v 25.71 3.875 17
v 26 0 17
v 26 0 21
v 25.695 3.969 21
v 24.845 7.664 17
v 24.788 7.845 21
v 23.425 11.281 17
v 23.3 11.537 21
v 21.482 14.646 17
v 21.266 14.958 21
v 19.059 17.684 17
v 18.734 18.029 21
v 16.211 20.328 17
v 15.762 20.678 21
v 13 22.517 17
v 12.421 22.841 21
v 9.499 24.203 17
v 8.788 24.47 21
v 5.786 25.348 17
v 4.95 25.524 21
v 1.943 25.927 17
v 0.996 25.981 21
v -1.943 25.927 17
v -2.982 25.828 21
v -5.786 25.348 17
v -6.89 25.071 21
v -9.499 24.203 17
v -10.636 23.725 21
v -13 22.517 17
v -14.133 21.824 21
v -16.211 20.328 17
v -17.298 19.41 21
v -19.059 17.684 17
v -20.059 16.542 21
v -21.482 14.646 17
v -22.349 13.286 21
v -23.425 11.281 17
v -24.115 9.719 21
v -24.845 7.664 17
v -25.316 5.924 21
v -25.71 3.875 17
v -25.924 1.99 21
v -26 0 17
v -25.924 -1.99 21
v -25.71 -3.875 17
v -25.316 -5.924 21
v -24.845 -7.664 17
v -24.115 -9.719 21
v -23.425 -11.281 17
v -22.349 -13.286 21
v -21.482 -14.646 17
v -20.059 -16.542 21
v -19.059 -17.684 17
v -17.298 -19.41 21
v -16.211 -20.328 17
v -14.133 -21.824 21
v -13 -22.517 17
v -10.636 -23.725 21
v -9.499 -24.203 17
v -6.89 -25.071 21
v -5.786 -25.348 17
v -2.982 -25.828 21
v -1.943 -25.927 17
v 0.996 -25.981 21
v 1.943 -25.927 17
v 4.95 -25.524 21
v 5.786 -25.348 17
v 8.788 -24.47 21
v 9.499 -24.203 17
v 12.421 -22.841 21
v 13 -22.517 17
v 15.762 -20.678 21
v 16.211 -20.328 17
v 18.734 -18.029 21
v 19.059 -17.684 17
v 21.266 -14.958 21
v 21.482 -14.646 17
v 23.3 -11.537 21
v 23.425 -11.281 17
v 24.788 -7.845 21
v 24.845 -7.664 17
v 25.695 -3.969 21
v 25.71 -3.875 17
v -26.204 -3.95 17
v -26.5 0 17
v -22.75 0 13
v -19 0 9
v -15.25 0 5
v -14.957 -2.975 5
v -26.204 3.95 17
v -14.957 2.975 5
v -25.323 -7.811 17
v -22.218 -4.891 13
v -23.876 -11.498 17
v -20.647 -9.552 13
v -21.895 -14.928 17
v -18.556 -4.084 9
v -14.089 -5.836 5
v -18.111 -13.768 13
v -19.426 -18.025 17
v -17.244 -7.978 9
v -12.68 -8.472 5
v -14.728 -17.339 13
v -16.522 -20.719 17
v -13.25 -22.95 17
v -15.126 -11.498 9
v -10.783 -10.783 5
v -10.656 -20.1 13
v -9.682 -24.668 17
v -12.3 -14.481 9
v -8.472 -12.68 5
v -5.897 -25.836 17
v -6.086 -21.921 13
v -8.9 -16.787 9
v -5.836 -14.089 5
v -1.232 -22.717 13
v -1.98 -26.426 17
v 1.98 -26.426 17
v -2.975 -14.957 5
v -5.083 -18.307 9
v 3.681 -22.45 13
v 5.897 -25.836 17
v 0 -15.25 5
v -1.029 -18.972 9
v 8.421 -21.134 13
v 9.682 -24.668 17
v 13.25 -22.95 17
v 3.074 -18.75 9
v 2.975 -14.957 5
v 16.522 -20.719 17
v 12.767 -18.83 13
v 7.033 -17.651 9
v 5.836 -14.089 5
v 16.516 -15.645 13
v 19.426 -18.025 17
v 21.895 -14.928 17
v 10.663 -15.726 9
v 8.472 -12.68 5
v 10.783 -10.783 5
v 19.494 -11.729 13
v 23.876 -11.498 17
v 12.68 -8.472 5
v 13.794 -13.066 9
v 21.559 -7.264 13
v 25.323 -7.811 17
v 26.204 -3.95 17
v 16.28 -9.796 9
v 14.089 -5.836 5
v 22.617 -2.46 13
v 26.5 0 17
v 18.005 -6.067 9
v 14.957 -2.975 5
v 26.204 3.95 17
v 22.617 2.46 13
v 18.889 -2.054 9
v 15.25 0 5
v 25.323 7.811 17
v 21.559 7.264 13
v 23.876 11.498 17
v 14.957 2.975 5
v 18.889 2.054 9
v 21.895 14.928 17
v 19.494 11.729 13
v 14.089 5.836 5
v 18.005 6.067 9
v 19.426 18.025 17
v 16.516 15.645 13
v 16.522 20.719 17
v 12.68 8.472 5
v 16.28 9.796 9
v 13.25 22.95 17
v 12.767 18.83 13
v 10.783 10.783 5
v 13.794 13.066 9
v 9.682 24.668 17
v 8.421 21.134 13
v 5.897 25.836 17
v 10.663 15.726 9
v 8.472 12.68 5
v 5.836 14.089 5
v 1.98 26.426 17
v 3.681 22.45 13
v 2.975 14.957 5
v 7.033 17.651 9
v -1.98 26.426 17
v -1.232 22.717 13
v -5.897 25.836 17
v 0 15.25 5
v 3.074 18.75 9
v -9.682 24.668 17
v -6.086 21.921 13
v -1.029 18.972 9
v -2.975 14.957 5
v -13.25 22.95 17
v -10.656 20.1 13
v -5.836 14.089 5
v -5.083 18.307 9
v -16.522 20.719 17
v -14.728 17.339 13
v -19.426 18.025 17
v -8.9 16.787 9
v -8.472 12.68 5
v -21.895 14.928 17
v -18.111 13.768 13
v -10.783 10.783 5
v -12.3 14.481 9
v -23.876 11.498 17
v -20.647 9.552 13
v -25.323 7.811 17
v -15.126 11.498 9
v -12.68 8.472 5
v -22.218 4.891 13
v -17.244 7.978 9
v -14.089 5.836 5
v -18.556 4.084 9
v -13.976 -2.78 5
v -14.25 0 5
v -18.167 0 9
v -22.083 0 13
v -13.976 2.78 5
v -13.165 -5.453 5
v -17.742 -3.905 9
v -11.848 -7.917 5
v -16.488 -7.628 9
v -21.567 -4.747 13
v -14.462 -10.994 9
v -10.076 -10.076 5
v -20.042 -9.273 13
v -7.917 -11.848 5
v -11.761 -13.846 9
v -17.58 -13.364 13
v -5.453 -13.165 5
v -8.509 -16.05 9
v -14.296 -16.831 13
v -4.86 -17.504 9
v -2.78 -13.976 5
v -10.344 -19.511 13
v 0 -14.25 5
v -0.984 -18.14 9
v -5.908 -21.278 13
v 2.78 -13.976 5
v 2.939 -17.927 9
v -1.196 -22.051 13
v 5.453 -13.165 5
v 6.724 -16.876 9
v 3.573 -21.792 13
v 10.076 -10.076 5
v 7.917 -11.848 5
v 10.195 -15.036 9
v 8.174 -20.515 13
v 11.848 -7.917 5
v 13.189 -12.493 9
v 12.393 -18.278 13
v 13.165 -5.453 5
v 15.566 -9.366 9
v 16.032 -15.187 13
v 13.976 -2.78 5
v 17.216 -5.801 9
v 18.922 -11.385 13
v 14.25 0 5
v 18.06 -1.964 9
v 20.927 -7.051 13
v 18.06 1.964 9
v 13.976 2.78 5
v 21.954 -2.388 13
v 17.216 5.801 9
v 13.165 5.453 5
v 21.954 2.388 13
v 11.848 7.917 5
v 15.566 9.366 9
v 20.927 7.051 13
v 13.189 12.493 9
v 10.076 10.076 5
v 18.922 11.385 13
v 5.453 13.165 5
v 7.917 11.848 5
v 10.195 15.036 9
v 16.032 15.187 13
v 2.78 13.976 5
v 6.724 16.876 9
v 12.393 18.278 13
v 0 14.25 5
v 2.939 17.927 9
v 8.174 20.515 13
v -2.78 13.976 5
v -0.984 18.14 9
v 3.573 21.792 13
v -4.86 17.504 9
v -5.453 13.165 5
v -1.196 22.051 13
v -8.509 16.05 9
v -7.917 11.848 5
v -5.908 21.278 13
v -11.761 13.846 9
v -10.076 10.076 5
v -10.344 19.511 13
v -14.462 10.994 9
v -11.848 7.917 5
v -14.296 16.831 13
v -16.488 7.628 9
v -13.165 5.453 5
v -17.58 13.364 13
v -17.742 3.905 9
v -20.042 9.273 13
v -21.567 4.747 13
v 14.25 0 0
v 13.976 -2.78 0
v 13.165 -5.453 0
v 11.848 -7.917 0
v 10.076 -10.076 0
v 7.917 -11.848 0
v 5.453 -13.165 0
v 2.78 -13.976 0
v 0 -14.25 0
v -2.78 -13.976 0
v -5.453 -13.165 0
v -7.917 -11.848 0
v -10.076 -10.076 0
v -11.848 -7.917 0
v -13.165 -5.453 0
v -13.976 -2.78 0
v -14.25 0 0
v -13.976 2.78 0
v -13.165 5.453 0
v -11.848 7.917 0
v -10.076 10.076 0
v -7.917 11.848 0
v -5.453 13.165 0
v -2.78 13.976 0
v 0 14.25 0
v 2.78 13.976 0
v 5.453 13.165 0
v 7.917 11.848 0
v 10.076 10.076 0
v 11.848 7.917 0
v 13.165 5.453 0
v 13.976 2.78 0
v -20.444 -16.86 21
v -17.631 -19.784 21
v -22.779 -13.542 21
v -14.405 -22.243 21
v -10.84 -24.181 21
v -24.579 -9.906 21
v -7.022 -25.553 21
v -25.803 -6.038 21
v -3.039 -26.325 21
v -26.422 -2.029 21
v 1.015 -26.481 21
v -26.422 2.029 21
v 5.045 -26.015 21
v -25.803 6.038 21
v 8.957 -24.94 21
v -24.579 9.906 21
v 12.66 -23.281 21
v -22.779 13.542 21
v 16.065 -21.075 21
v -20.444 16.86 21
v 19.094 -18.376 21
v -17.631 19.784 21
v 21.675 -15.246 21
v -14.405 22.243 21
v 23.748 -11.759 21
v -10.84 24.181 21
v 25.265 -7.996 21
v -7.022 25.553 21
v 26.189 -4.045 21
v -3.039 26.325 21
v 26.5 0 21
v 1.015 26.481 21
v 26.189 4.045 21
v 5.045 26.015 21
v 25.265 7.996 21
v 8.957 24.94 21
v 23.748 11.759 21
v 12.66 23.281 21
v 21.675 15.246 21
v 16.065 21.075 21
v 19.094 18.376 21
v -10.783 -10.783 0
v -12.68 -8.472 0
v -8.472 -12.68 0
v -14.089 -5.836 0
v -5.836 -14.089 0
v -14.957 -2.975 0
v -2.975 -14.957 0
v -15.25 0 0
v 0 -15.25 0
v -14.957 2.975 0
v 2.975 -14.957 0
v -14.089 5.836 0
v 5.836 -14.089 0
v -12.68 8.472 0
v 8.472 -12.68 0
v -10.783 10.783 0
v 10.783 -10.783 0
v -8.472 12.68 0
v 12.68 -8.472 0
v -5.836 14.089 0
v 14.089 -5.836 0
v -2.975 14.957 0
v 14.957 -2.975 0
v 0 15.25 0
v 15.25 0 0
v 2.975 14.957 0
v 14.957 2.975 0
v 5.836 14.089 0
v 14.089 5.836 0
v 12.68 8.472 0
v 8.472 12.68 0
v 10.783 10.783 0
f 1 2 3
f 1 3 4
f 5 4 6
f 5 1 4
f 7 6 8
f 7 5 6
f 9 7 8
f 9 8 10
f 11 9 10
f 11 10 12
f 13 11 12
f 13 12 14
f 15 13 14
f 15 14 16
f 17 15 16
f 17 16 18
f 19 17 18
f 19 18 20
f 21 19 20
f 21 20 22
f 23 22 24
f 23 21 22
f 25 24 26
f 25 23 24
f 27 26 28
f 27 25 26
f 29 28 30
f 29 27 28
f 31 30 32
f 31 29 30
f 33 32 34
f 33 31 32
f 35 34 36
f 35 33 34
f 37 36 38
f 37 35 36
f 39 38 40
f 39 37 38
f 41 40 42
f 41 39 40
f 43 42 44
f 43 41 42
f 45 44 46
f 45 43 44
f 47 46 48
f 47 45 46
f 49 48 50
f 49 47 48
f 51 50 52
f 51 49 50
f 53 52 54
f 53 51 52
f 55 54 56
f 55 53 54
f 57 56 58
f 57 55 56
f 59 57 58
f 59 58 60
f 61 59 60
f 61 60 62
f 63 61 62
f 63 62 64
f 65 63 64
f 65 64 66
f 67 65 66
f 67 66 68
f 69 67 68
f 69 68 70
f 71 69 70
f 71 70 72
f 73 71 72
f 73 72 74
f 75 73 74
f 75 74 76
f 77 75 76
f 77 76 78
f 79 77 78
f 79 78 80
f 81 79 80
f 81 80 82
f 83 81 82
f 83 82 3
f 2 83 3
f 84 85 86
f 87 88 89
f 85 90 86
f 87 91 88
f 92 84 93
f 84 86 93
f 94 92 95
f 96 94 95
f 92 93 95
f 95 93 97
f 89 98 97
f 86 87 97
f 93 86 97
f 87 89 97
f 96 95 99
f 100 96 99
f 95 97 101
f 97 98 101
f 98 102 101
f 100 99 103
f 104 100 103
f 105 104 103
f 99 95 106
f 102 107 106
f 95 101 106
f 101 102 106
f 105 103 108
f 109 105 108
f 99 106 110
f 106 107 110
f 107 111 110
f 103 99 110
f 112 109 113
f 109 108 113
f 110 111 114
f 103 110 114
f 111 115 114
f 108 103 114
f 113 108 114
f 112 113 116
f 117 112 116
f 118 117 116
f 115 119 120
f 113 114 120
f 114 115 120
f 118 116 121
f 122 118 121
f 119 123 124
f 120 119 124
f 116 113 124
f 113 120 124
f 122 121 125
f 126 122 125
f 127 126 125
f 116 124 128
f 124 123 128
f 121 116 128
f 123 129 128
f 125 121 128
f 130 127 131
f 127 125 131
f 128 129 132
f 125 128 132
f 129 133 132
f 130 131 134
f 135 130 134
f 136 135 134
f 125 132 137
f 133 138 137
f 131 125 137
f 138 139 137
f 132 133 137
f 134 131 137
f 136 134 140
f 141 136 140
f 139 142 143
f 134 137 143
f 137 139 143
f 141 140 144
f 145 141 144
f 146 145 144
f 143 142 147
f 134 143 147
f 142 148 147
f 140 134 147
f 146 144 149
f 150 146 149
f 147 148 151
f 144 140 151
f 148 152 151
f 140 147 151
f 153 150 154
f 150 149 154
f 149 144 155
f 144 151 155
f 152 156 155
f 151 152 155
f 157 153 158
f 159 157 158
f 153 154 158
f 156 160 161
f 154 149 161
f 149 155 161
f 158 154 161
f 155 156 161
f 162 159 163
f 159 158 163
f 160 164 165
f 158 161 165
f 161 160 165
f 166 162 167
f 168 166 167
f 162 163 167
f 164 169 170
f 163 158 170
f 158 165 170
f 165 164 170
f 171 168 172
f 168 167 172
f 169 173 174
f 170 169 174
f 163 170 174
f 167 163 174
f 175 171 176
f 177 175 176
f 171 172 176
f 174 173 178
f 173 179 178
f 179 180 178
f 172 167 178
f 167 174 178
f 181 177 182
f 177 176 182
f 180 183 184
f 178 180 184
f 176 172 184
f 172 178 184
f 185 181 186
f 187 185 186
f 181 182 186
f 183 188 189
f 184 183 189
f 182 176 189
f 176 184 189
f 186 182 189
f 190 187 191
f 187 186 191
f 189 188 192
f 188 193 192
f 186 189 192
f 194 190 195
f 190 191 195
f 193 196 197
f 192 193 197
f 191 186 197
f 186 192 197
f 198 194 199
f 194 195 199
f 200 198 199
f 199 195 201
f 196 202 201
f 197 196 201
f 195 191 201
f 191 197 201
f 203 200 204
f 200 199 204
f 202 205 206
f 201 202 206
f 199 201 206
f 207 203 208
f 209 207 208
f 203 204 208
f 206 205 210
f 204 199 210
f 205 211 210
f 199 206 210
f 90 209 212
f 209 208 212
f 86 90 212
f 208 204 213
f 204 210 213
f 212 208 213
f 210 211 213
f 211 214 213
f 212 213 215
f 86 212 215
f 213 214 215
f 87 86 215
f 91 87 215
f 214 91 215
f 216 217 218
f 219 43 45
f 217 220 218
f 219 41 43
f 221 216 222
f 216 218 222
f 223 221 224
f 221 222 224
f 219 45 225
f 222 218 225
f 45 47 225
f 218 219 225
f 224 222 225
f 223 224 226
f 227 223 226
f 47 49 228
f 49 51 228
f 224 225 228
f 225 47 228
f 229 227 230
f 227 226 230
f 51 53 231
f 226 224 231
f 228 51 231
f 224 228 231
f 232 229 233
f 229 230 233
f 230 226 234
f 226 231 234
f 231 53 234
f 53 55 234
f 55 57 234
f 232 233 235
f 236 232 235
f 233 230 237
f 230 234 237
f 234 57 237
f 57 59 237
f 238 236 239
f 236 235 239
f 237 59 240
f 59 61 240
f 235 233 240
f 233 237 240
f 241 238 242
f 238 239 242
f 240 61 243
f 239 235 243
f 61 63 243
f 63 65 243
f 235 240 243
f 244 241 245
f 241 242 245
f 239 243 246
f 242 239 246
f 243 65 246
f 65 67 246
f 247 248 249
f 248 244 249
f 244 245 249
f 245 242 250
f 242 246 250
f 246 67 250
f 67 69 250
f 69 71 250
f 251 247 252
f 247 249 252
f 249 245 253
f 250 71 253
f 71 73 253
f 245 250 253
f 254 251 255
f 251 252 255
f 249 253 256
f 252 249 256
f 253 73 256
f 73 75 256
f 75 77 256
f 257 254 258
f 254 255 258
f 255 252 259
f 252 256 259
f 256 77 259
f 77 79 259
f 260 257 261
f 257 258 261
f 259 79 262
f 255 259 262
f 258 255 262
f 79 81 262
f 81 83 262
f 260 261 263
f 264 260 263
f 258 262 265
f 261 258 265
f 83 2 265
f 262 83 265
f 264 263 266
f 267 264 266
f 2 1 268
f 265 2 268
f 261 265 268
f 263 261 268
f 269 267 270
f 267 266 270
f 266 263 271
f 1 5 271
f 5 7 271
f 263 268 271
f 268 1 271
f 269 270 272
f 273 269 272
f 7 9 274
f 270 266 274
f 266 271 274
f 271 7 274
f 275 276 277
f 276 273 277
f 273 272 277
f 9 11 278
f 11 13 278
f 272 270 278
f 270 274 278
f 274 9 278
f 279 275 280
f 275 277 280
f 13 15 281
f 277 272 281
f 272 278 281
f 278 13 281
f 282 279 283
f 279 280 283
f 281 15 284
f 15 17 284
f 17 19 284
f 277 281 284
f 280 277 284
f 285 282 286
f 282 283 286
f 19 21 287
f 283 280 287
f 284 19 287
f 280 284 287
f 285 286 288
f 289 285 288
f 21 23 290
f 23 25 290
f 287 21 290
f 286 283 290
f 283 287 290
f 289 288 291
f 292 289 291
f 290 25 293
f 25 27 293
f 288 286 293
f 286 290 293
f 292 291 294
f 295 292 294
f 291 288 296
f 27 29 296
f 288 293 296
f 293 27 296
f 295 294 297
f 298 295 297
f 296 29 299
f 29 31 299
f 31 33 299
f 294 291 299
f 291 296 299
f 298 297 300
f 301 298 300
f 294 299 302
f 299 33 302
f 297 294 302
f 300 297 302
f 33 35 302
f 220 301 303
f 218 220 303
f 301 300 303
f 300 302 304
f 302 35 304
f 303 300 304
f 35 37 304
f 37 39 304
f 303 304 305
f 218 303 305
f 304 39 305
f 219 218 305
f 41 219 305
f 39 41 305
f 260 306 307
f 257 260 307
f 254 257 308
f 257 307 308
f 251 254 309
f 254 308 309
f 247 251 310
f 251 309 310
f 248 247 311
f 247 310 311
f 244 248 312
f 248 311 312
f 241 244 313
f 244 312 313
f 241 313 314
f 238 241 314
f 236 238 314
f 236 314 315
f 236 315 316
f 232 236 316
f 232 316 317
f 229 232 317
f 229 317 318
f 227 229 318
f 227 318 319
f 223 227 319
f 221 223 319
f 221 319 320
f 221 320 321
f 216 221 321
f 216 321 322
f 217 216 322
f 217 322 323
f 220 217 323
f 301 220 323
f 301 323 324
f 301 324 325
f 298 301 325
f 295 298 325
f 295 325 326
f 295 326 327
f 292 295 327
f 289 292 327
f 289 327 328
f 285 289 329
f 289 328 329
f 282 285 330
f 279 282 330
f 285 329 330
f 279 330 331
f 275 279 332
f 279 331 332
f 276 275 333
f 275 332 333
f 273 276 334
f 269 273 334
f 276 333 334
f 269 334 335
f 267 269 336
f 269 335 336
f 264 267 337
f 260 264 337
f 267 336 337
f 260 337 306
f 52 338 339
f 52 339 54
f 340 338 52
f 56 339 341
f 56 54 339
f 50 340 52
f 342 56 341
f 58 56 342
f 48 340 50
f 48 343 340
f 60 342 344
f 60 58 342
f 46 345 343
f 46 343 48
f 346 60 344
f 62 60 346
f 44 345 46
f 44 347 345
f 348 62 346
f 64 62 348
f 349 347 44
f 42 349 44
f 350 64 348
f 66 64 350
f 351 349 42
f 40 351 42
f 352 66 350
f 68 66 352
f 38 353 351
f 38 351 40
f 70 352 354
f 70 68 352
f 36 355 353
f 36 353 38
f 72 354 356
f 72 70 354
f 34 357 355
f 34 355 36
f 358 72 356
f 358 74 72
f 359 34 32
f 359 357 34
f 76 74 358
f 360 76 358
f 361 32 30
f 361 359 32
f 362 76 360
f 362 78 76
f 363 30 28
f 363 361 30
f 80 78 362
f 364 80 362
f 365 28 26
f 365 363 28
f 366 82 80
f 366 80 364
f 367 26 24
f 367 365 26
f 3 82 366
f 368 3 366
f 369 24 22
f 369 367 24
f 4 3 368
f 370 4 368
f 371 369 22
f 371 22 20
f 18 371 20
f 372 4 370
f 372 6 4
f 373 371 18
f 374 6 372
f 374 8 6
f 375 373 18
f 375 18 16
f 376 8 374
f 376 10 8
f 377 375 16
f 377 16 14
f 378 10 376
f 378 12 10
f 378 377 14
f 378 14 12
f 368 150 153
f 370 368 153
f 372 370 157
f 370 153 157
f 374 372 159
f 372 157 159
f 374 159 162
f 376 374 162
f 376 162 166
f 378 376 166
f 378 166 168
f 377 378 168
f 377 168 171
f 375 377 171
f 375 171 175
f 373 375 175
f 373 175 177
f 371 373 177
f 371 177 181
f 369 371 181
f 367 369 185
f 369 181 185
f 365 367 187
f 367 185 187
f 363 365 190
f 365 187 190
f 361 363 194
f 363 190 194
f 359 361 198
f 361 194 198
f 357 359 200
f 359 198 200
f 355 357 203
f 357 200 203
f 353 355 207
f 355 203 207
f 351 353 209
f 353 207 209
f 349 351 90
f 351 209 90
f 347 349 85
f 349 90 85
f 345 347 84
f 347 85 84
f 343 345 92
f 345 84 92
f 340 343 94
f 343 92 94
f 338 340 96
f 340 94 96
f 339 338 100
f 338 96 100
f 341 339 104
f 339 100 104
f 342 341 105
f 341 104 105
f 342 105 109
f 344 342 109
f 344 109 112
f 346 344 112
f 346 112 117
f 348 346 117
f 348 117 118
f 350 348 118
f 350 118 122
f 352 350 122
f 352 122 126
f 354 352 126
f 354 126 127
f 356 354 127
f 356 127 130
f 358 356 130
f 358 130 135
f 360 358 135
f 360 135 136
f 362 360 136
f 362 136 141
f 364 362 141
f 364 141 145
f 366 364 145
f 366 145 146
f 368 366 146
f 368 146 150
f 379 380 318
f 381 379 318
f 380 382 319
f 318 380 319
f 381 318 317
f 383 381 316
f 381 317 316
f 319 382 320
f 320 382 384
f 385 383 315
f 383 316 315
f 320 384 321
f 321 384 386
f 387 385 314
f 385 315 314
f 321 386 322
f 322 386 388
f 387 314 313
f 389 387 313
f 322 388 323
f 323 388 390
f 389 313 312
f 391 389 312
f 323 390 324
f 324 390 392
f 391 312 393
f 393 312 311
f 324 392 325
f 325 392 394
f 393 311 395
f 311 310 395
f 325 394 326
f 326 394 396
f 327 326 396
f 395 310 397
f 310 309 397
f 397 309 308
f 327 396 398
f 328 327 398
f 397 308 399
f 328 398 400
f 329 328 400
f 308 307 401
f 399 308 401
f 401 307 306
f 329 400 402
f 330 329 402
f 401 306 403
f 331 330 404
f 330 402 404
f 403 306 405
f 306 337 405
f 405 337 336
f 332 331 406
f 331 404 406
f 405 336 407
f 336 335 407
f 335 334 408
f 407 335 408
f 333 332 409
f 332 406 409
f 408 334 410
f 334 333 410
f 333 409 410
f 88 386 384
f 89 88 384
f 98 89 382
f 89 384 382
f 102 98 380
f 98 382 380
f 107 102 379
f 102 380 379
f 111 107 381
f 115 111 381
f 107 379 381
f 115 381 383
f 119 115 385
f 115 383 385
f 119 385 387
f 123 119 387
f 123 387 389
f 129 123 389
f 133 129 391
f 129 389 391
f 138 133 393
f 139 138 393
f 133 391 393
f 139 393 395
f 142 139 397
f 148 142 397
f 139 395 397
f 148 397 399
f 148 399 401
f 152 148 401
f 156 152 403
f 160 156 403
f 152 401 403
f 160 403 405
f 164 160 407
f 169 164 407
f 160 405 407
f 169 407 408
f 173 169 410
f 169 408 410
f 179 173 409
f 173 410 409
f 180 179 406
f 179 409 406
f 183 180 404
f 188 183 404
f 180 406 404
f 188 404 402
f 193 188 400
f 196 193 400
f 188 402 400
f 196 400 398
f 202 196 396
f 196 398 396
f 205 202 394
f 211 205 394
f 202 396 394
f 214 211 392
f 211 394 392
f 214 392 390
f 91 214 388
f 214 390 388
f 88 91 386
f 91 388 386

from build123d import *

# Parameters (mm, degrees)
F1_DEPTH = 5
F3_R     = 26.5
F3_R_2   = 26
F6_DEPTH = 4


with BuildPart() as f1:
    # F0 (on Top) → F1 (new body)
    with BuildSketch(Plane.XY):
        with BuildLine():
            ThreePointArc((-14.25, 0), (0, 14.25), (14.25, 0))
            Line((14.25, 0), (15.25, 0))
            ThreePointArc((15.25, 0), (0, 15.25), (-15.25, 0))
            Line((-15.25, 0), (-14.25, 0))
        make_face()
        with BuildLine():
            Line((15.25, 0), (14.25, 0))
            ThreePointArc((14.25, 0), (0, -14.25), (-14.25, 0))
            Line((-14.25, 0), (-15.25, 0))
            ThreePointArc((-15.25, 0), (0, -15.25), (15.25, 0))
        make_face()
    extrude(amount=F1_DEPTH)

    # F4 (on Front) → F5 (revolve)
    with BuildSketch(Plane.XZ):
        Polygon((-26.5, 17), (-15.25, 5), (-14.25, 5), (-26, 17), align=None)
    revolve(axis=Axis((0, 0, 35.630243), (0, 0, 1)))

    # F3 (on offset) → F6 (join)
    with BuildSketch(Plane.XY.offset(17)):
        Circle(F3_R)
        Circle(F3_R_2, mode=Mode.SUBTRACT)
    extrude(amount=F6_DEPTH)


solid = f1.part
